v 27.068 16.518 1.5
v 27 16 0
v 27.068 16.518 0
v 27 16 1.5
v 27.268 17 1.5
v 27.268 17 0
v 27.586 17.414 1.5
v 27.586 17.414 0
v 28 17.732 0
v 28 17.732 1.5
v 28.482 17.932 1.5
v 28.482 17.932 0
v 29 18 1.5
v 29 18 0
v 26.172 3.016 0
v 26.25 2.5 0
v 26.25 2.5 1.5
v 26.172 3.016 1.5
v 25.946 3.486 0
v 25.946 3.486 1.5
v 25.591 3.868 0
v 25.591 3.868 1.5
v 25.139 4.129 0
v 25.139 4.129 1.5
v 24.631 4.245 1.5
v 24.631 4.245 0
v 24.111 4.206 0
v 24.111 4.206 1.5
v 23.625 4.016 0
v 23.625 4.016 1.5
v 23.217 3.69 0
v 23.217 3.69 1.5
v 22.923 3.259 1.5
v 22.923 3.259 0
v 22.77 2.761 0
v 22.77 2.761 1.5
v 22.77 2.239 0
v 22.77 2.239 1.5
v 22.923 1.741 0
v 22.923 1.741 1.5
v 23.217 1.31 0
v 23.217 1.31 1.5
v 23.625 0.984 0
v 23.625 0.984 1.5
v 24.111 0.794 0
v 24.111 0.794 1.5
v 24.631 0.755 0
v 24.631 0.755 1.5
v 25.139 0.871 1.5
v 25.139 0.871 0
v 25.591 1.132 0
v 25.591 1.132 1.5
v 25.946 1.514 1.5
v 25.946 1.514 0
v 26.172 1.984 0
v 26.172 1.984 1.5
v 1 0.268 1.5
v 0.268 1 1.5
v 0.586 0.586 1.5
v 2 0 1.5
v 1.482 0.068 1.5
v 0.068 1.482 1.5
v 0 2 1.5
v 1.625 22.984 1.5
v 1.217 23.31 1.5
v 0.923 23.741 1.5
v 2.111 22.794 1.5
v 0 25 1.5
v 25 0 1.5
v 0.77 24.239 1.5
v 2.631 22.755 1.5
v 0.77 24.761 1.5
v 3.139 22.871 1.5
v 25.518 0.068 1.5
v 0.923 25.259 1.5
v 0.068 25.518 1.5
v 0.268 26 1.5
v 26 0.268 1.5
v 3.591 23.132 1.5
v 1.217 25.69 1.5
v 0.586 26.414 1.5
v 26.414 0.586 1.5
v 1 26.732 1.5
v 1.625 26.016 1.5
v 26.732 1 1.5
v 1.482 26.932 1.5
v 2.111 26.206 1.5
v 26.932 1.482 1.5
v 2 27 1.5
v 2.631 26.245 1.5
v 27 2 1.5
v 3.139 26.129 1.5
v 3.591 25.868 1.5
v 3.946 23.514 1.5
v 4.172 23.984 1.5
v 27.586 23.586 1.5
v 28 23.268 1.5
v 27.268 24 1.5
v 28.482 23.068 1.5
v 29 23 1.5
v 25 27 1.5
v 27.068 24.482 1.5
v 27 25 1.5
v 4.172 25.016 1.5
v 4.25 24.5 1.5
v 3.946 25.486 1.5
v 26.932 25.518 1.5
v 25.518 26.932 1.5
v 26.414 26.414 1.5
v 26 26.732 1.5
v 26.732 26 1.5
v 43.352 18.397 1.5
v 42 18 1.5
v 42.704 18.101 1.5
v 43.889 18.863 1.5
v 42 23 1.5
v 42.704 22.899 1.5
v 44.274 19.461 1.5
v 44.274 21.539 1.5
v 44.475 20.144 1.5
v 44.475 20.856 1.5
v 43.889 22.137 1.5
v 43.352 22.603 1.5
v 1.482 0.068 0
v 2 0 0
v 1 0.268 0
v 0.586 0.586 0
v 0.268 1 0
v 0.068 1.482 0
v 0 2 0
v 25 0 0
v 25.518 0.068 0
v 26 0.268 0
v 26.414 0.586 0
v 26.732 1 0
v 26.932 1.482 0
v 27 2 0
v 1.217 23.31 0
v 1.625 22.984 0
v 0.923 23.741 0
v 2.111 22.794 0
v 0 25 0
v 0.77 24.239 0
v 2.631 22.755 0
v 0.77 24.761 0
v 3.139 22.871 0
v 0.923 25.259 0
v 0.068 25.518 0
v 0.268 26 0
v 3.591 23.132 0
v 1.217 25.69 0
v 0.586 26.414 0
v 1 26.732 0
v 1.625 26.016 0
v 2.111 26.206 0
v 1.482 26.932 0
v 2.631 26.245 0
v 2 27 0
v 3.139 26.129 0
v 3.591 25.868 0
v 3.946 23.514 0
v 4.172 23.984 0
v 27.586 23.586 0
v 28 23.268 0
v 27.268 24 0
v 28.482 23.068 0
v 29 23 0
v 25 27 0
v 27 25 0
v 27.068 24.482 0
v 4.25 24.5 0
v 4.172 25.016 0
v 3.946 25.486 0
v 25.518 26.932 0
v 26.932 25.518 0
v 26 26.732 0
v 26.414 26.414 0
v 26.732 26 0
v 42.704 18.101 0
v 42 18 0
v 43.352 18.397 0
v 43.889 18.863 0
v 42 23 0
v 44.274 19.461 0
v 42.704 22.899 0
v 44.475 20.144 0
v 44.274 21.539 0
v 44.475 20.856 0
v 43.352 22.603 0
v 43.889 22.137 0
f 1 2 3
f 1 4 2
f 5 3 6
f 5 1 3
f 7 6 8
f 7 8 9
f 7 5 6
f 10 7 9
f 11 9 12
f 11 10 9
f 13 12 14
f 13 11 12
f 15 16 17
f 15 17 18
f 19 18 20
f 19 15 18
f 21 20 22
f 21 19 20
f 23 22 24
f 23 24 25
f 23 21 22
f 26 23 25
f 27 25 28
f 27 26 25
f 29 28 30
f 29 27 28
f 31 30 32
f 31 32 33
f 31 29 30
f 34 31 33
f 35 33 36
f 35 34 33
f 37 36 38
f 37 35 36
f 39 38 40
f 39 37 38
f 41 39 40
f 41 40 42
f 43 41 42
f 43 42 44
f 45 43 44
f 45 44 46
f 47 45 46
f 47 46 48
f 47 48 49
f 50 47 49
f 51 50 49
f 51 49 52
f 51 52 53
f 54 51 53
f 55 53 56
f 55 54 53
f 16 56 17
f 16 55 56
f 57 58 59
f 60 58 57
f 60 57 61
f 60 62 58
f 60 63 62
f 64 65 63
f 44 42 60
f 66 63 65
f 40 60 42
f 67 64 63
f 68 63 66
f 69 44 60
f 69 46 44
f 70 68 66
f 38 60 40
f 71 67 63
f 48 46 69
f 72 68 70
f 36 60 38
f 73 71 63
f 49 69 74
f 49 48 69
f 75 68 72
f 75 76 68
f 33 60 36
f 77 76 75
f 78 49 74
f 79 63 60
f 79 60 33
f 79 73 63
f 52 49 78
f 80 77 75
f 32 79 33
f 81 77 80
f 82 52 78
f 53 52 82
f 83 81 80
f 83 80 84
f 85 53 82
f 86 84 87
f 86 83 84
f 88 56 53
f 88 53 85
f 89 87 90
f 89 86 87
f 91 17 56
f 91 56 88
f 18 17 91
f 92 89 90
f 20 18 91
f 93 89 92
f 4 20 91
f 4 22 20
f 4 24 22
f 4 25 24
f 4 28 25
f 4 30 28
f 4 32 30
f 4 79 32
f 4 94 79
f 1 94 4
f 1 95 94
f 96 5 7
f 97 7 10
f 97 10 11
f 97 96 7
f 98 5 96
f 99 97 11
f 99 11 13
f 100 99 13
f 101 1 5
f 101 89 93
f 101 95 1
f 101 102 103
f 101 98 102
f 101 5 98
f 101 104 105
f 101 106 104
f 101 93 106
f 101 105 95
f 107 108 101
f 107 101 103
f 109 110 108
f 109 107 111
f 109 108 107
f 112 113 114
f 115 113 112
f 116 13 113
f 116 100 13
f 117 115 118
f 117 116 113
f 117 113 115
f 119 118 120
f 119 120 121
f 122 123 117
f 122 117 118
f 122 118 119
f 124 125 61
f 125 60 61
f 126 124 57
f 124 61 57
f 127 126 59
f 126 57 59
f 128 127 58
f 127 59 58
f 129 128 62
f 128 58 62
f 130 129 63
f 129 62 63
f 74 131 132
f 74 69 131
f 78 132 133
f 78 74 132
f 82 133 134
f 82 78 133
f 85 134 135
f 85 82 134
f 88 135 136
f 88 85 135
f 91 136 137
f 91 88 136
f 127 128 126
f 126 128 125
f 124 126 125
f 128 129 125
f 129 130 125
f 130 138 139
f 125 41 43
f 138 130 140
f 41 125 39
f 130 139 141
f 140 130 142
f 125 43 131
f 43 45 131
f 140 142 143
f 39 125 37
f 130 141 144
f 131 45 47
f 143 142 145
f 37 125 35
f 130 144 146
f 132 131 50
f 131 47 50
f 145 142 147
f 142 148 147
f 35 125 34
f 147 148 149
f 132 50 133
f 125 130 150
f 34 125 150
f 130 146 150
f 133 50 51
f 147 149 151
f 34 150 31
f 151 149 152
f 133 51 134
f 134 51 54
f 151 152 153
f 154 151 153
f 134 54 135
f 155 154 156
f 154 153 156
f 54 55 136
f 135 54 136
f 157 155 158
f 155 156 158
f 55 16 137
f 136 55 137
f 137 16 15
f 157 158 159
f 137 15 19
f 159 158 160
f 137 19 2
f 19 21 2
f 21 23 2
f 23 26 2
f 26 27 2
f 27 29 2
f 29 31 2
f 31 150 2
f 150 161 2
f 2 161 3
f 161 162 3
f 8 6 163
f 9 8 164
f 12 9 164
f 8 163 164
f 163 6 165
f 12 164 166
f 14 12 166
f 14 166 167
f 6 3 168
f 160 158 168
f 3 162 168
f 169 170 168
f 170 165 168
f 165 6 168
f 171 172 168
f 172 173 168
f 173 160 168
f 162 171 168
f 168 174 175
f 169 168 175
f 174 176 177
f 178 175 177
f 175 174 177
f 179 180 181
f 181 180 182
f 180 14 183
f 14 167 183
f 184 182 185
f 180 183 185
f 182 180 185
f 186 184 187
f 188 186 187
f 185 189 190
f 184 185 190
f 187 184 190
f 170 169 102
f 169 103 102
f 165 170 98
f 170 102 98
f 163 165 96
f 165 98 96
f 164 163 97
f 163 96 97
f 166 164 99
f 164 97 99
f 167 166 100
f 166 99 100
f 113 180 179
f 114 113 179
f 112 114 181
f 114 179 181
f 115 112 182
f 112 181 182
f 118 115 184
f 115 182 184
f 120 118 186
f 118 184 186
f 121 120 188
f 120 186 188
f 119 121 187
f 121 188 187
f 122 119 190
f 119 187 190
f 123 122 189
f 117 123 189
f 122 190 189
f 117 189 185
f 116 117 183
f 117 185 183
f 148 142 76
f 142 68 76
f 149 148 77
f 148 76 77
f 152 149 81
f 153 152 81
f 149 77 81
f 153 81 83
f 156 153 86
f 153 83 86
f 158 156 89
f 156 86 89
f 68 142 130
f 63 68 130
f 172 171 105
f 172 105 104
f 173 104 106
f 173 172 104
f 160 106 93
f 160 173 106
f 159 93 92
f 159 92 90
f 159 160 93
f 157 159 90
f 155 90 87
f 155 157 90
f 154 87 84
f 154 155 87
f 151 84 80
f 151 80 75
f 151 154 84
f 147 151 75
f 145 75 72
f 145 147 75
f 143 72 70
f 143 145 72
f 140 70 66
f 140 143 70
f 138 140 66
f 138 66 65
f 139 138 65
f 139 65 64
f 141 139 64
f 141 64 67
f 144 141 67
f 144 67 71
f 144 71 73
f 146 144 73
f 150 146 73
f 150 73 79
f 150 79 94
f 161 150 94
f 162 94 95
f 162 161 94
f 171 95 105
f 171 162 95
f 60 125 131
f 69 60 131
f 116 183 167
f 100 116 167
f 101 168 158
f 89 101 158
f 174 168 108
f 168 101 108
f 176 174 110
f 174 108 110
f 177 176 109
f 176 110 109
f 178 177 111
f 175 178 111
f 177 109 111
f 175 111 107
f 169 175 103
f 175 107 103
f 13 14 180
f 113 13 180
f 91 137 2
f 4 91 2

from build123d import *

# Parameters (mm, degrees)
ESQUISSE1_R        = 1.75
BOSS_EXTRU_1_DEPTH = 1.5
CONG_1_R           = 2


with BuildPart() as part:
    # Esquisse1 → Boss.-Extru.1 (new body)
    with BuildSketch(Plane.XY):
        with BuildLine():
            Line((0, 0), (27, 0))
            Line((27, 0), (27, 18))
            Line((27, 18), (42, 18))
            ThreePointArc((42, 18), (44.5, 20.5), (42, 23))
            Line((42, 23), (27, 23))
            Line((27, 23), (27, 27))
            Line((27, 27), (0, 27))
            Line((0, 27), (0, 0))
        make_face()
        with Locations((2.5, 24.5)):
            Circle(ESQUISSE1_R, mode=Mode.SUBTRACT)
        with Locations((24.5, 2.5)):
            Circle(ESQUISSE1_R, mode=Mode.SUBTRACT)
    extrude(amount=BOSS_EXTRU_1_DEPTH)

    # Congé1
    cong_1_edges = [part.edges().sort_by_distance(p)[0] for p in [
        (27, 23, 0.75),
        (27, 18, 0.75),
        (27, 0, 0.75),
        (0, 0, 0.75),
        (0, 27, 0.75),
        (27, 27, 0.75),
    ]]
    fillet(cong_1_edges, radius=CONG_1_R - 0.0001)  # a hair under: the kernel refuses the full size


solid = part.part
